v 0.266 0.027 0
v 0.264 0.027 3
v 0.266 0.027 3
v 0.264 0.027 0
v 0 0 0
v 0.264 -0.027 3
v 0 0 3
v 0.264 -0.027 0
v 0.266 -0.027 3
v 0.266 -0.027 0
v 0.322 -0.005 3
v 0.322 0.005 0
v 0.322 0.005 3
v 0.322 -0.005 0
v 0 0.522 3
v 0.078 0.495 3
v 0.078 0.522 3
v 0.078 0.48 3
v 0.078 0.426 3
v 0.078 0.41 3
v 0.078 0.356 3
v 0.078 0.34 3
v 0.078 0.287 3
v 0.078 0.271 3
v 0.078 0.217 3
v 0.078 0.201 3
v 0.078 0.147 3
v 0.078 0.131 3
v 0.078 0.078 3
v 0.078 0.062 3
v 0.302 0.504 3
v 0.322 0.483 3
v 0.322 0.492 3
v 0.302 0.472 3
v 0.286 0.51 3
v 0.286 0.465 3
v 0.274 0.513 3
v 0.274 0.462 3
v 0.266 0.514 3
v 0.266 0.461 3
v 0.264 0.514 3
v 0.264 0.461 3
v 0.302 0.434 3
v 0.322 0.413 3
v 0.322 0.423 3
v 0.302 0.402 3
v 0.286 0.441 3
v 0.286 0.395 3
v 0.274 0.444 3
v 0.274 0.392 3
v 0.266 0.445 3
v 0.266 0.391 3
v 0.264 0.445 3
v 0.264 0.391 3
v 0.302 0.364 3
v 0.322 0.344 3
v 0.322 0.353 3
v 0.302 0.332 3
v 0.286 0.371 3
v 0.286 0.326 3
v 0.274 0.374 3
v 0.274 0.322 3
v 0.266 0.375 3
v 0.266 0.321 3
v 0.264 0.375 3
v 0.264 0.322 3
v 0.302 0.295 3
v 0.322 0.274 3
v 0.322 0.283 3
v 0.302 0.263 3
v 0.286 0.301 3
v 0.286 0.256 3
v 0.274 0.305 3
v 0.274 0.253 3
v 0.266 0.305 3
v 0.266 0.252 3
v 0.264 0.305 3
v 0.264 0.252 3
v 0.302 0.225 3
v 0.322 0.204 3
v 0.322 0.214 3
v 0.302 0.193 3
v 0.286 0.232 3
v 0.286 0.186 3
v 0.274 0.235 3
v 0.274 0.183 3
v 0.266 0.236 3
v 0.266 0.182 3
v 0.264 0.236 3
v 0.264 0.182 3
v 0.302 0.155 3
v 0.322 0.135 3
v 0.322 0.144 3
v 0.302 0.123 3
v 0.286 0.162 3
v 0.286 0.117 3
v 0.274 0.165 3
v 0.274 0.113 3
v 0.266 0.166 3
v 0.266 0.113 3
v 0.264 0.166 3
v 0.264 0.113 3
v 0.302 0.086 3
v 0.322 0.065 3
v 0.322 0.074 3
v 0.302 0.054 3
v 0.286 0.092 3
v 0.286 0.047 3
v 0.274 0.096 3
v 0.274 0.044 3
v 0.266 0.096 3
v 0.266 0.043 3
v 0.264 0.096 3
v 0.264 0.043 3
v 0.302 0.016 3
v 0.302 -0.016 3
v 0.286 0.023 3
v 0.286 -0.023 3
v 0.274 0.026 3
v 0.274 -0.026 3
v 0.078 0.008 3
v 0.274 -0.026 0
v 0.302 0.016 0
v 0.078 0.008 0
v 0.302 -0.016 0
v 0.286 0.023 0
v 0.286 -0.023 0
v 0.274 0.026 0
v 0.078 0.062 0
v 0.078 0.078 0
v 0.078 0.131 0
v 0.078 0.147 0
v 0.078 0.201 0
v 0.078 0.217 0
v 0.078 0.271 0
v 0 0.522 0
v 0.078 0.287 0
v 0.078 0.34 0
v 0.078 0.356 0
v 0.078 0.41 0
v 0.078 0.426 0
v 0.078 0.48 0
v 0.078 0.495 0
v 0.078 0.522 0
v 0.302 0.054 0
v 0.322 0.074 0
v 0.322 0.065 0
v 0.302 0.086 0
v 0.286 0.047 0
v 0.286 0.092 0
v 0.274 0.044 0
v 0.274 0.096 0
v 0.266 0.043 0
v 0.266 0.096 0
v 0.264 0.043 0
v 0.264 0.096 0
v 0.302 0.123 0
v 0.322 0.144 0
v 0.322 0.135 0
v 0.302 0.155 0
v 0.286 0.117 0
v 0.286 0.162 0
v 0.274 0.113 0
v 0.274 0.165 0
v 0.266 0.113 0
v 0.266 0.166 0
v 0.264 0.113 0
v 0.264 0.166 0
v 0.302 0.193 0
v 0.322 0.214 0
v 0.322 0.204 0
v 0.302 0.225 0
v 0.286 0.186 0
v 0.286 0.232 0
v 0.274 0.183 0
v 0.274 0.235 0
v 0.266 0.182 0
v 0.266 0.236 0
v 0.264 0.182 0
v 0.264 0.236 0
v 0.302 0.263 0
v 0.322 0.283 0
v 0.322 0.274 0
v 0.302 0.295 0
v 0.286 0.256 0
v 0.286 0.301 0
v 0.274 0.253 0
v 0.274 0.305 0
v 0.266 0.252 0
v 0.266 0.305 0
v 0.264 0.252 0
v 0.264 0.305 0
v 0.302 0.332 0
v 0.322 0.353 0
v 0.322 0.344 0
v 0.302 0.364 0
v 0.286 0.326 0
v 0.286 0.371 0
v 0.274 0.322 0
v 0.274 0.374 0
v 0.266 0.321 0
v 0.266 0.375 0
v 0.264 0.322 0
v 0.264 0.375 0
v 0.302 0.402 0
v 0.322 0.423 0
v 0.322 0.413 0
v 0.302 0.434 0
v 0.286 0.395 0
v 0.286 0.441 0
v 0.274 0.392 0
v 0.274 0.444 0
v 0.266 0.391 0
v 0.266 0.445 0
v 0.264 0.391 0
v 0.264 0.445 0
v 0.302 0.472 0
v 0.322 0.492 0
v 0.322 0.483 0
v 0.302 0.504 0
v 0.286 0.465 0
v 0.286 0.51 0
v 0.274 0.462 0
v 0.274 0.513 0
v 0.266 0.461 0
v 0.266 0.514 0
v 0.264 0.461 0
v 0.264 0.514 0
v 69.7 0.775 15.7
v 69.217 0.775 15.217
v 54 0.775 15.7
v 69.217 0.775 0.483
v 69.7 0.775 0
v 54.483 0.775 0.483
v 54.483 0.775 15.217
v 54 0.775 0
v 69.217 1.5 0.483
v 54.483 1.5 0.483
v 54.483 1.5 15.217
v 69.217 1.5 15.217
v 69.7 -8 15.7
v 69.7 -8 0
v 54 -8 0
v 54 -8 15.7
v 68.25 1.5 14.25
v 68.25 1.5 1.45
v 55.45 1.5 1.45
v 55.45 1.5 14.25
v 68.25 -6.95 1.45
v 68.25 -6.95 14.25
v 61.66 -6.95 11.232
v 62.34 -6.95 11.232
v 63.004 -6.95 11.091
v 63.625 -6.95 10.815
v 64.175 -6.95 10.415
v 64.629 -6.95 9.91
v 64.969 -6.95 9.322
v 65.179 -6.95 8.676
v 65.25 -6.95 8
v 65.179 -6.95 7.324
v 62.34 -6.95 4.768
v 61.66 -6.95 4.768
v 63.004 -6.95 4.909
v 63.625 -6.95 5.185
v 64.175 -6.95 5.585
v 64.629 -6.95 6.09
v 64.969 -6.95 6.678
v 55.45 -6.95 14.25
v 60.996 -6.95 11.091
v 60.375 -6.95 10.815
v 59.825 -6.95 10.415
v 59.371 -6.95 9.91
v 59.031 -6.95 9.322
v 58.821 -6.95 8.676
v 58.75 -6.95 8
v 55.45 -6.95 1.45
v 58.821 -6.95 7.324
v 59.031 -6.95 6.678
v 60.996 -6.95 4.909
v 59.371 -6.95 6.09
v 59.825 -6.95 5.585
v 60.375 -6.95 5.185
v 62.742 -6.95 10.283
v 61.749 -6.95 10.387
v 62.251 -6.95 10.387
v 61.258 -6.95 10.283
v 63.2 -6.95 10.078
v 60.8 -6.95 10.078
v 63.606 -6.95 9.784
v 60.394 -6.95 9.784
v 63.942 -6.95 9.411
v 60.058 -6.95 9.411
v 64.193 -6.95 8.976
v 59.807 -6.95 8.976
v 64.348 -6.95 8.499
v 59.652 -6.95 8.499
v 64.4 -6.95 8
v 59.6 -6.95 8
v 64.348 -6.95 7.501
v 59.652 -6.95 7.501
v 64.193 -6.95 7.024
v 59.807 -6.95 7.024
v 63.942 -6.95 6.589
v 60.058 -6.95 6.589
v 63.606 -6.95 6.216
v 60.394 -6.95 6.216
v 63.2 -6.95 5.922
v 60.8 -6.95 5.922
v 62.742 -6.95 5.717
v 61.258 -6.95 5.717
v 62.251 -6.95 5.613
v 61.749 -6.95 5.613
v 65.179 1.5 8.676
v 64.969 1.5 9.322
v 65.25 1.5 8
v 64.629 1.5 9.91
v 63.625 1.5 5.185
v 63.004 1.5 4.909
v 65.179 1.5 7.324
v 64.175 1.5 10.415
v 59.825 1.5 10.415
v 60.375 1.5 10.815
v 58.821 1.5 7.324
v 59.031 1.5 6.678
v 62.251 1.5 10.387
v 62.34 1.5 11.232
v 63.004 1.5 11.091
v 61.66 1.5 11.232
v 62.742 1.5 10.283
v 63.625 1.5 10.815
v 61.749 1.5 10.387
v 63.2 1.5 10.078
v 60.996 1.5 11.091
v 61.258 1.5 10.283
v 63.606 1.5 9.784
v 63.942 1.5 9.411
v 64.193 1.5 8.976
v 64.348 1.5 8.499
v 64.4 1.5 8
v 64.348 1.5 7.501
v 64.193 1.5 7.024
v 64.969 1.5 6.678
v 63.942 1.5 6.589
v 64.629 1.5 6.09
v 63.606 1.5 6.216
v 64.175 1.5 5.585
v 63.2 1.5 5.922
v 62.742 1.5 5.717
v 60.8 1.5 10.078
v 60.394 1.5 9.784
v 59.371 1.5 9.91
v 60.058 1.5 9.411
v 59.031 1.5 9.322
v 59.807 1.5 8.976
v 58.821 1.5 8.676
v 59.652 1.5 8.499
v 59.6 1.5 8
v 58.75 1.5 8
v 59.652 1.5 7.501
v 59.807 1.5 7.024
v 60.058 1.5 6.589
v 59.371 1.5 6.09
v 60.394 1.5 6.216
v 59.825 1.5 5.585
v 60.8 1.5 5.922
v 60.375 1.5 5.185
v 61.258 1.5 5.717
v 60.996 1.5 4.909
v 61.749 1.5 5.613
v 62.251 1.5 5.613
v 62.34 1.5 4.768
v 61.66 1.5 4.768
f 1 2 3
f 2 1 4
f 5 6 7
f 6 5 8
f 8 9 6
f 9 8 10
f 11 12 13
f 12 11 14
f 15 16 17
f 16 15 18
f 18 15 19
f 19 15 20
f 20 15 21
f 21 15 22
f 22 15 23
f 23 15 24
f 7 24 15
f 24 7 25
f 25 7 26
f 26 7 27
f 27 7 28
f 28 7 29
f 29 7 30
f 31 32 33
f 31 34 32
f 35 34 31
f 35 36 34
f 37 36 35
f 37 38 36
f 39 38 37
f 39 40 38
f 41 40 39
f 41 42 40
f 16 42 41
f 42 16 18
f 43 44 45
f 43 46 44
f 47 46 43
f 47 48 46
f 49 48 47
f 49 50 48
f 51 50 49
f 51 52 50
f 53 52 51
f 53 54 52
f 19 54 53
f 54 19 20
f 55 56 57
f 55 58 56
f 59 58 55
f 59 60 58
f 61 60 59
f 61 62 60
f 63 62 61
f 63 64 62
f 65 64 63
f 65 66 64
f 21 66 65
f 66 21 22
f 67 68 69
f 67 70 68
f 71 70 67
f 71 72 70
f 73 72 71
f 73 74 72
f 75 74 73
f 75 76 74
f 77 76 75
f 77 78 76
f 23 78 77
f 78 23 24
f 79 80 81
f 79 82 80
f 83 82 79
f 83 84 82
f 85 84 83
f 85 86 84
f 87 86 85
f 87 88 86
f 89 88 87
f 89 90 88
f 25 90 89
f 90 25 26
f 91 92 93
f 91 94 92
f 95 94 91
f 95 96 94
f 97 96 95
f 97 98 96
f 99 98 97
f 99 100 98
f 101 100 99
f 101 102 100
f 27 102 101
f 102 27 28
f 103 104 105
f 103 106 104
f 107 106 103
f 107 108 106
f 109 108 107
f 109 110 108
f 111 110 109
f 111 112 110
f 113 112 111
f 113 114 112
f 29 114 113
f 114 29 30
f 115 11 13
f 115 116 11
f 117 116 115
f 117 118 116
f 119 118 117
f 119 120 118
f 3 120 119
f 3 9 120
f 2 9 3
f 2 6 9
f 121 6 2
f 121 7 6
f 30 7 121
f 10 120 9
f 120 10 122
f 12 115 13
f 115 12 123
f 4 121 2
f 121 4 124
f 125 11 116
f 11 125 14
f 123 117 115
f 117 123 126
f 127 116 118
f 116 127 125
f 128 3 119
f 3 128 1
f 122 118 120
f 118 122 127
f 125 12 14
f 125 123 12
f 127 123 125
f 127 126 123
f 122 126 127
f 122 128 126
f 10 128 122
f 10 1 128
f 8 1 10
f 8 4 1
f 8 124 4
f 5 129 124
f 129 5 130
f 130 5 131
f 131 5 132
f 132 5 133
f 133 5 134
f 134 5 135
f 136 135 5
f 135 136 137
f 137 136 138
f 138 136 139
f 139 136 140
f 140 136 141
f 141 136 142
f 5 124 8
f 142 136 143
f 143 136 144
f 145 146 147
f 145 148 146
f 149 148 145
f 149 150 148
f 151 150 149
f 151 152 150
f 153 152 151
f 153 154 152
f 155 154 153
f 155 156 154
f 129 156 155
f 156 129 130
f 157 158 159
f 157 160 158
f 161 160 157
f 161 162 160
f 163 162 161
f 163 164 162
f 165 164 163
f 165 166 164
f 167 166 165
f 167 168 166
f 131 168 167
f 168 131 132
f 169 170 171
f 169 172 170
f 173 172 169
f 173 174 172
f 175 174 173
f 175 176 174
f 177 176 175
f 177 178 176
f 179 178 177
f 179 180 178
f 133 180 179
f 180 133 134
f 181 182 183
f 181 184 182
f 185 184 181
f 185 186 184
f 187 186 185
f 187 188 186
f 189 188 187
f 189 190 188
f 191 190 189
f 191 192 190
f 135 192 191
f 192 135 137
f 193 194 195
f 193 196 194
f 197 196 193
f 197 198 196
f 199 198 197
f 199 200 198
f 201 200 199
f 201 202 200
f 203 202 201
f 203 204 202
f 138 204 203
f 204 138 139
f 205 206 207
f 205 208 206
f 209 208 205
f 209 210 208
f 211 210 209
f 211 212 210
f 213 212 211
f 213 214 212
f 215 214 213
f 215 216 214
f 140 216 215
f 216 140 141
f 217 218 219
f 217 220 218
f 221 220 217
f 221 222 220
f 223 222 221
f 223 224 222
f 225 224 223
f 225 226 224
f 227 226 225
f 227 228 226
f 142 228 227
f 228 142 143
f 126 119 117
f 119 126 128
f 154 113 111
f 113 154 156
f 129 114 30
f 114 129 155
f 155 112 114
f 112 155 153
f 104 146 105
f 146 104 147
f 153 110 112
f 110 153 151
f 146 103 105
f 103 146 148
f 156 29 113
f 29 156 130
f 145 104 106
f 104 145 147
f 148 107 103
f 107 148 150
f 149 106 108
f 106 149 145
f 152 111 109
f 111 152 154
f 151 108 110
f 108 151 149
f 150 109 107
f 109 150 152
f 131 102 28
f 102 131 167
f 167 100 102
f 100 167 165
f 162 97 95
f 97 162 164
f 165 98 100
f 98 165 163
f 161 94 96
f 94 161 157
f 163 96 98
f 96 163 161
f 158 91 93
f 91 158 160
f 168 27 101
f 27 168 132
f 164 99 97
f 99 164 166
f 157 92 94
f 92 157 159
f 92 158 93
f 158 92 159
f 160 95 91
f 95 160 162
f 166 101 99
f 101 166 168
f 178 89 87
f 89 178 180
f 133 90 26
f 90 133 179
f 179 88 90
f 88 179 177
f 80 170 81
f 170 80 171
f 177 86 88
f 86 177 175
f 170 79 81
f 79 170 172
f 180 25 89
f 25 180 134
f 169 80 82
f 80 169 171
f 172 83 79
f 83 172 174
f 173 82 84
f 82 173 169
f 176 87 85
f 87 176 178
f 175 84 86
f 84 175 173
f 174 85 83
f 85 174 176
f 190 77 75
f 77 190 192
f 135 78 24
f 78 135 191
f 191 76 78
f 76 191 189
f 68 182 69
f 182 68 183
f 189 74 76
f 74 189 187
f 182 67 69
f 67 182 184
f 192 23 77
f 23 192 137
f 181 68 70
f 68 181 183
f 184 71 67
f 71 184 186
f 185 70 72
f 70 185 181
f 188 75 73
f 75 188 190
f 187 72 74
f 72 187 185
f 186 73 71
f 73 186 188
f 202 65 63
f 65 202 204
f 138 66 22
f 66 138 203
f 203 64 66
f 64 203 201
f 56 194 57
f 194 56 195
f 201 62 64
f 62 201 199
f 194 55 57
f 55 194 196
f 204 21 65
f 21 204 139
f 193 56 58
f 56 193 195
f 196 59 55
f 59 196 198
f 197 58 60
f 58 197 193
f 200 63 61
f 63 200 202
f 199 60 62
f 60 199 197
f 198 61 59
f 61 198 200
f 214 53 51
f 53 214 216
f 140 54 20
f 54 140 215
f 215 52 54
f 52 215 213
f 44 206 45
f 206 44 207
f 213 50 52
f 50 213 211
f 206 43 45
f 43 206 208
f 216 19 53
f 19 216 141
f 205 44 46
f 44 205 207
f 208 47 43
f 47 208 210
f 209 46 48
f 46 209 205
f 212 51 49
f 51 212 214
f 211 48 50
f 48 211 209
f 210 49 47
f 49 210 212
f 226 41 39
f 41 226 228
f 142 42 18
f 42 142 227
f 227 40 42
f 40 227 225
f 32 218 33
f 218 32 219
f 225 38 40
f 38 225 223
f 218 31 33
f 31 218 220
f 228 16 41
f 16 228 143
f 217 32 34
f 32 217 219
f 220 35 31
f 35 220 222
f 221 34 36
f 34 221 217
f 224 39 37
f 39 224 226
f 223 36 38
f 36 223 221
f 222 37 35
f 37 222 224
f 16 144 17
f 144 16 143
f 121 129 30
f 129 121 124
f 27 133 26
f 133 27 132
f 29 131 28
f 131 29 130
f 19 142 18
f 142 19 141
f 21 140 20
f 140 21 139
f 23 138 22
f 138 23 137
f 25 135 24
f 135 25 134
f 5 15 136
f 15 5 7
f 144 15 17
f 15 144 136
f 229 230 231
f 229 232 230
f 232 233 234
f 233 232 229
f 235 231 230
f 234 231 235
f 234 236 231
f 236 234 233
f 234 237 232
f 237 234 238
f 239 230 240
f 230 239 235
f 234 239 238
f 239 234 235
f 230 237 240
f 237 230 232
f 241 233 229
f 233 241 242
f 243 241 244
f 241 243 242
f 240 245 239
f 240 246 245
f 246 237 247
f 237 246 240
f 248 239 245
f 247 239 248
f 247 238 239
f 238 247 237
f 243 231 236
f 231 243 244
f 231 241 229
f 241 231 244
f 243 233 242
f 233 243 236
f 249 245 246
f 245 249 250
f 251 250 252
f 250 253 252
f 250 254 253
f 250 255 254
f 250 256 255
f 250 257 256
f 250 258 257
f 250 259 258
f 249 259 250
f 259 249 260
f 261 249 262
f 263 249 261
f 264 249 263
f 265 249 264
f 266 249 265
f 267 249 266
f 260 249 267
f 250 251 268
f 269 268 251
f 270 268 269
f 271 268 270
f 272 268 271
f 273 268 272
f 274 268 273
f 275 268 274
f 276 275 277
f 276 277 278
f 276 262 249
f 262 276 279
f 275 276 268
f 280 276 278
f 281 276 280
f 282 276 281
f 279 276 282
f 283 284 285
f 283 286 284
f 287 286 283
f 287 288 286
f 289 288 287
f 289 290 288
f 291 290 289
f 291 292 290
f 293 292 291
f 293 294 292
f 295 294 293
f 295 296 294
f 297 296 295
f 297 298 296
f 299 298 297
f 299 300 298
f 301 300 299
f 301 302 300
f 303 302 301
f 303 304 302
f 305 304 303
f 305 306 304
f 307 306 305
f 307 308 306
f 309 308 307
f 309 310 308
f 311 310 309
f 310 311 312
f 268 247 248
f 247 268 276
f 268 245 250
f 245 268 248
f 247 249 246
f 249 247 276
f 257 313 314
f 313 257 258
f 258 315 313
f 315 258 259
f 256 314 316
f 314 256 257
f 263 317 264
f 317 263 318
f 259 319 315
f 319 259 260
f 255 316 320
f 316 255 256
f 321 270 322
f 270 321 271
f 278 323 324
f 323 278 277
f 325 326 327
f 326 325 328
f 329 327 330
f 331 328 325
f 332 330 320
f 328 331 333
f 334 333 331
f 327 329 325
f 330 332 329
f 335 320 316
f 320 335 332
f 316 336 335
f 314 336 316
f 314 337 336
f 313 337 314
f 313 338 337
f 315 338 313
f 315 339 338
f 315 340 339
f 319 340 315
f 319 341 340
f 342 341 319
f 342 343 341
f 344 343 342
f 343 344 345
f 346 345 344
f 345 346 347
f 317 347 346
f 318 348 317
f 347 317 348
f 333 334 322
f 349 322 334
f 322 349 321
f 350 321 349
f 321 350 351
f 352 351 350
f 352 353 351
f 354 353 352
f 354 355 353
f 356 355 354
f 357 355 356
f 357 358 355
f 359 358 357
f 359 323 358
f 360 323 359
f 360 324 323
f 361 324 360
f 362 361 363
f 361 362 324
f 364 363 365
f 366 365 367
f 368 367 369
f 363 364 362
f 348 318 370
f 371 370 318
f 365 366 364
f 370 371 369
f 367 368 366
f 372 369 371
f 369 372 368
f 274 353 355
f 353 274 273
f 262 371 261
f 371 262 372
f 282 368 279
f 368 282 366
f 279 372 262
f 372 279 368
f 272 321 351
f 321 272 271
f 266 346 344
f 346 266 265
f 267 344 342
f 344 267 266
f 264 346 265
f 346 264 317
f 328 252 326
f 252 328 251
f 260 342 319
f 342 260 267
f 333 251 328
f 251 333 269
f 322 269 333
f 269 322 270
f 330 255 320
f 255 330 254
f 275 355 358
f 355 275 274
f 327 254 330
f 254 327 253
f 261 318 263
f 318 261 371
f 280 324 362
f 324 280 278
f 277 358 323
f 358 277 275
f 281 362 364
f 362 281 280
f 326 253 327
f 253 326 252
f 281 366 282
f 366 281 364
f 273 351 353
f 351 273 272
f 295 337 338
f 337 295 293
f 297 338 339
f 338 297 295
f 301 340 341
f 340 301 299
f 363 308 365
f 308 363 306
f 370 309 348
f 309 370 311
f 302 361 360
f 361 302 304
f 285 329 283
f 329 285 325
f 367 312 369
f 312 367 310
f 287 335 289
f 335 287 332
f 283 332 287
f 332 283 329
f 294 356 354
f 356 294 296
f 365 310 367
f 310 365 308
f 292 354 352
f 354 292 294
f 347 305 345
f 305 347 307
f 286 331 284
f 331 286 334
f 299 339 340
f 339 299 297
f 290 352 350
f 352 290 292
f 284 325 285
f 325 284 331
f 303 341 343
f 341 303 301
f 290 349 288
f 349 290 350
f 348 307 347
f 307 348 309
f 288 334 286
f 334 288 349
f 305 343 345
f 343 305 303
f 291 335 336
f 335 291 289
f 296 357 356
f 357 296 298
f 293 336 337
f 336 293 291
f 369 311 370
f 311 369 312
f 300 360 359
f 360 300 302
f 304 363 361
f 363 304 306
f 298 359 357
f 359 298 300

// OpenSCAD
// file: settings.scad
tooth_width=4;
rack_tooth_count=27;
tooth_height=7.5;
wheel_tooth_count=10;
// file: ../mcad/lego_compatibility.scad
// This file is placed under the public domain

// from: http://www.thingiverse.com/thing:9512
// Author: nefercheprure

// Examples:
//   standard LEGO 2x1 tile has no pin
//      block(1,2,1/3,reinforcement=false,flat_top=true);
//   standard LEGO 2x1 flat has pin
//      block(1,2,1/3,reinforcement=true);
//   standard LEGO 2x1 brick has pin
//      block(1,2,1,reinforcement=true);
//   standard LEGO 2x1 brick without pin
//      block(1,2,1,reinforcement=false);
//   standard LEGO 2x1x5 brick has no pin and has hollow knobs
//      block(1,2,5,reinforcement=false,hollow_knob=true);


knob_diameter=4.8;		//knobs on top of blocks
knob_height=2;
knob_spacing=8.0;
wall_thickness=1.45;
roof_thickness=1.05;
block_height=9.5;
pin_diameter=3;		//pin for bottom blocks with width or length of 1
post_diameter=6.5;
reinforcing_width=1.5;
axle_spline_width=2.0;
axle_diameter=5;
cylinder_precision=0.5;

/* EXAMPLES:

block(2,1,1/3,axle_hole=false,circular_hole=true,reinforcement=true,hollow_knob=true,flat_top=true);

translate([50,-10,0])
	block(1,2,1/3,axle_hole=false,circular_hole=true,reinforcement=false,hollow_knob=true,flat_top=true);

translate([10,0,0])
	block(2,2,1/3,axle_hole=false,circular_hole=true,reinforcement=true,hollow_knob=true,flat_top=true);
translate([30,0,0])
	block(2,2,1/3,axle_hole=false,circular_hole=true,reinforcement=true,hollow_knob=false,flat_top=false);
translate([50,0,0])
	block(2,2,1/3,axle_hole=false,circular_hole=true,reinforcement=true,hollow_knob=true,flat_top=false);
translate([0,20,0])
	block(3,2,2/3,axle_hole=false,circular_hole=true,reinforcement=true,hollow_knob=true,flat_top=false);
translate([20,20,0])
	block(3,2,1,axle_hole=true,circular_hole=false,reinforcement=true,hollow_knob=false,flat_top=false);
translate([40,20,0])
	block(3,2,1/3,axle_hole=false,circular_hole=false,reinforcement=false,hollow_knob=false,flat_top=false);
translate([0,-10,0])
	block(1,5,1/3,axle_hole=true,circular_hole=false,reinforcement=true,hollow_knob=false,flat_top=false);
translate([0,-20,0])
	block(1,5,1/3,axle_hole=true,circular_hole=false,reinforcement=true,hollow_knob=true,flat_top=false);
translate([0,-30,0])
	block(1,5,1/3,axle_hole=true,circular_hole=false,reinforcement=true,hollow_knob=true,flat_top=true);
//*/

module block(width,length,height,axle_hole=false,reinforcement=false, hollow_knob=false, flat_top=false, circular_hole=false, solid_bottom=true, center=false) {
	overall_length=(length-1)*knob_spacing+knob_diameter+wall_thickness*2;
	overall_width=(width-1)*knob_spacing+knob_diameter+wall_thickness*2;
	center= center==true ? 1 : 0;
	translate(center*[-overall_length/2, -overall_width/2, 0])
	union() {
		difference() {
			union() {
				// body:
				cube([overall_length,overall_width,height*block_height]);
				// knobs:
				if (flat_top != true)
				translate([knob_diameter/2+wall_thickness,knob_diameter/2+wall_thickness,0]) 
					for (ycount=[0:width-1])
						for (xcount=[0:length-1]) {
							translate([xcount*knob_spacing,ycount*knob_spacing,0])
								difference() {
									cylinder(r=knob_diameter/2,h=block_height*height+knob_height,$fs=cylinder_precision);
									if (hollow_knob==true)
										translate([0,0,-roof_thickness])
											cylinder(r=pin_diameter/2,h=block_height*height+knob_height+2*roof_thickness,$fs=cylinder_precision);
								}
					}
			}
			// hollow bottom:
			if (solid_bottom == false)
				translate([wall_thickness,wall_thickness,-roof_thickness]) cube([overall_length-wall_thickness*2,overall_width-wall_thickness*2,block_height*height]);
			// flat_top -> groove around bottom
			if (flat_top == true) {
				translate([-wall_thickness/2,-wall_thickness*2/3,-wall_thickness/2])
					cube([overall_length+wall_thickness,wall_thickness,wall_thickness]);
				translate([-wall_thickness/2,overall_width-wall_thickness/3,-wall_thickness/2])
					cube([overall_length+wall_thickness,wall_thickness,wall_thickness]);
	
				translate([-wall_thickness*2/3,-wall_thickness/2,-wall_thickness/2])
					cube([wall_thickness,overall_width+wall_thickness,wall_thickness]);
				translate([overall_length-wall_thickness/3,0,-wall_thickness/2])
					cube([wall_thickness,overall_width+wall_thickness,wall_thickness]);
			}
			if (axle_hole==true)
				if (width>1 && length>1) for (ycount=[1:width-1])
					for (xcount=[1:length-1])
						translate([xcount*knob_spacing,ycount*knob_spacing,roof_thickness])  axle(height);
			if (circular_hole==true)
				if (width>1 && length>1) for (ycount=[1:width-1])
					for (xcount=[1:length-1])
						translate([xcount*knob_spacing,ycount*knob_spacing,roof_thickness])
							cylinder(r=knob_diameter/2, h=height*block_height+roof_thickness/4,$fs=cylinder_precision);
		}

		if (reinforcement==true && width>1 && length>1)
			difference() {
				for (ycount=[1:width-1])
					for (xcount=[1:length-1])
						translate([xcount*knob_spacing,ycount*knob_spacing,0]) reinforcement(height);
				for (ycount=[1:width-1])
					for (xcount=[1:length-1])
						translate([xcount*knob_spacing,ycount*knob_spacing,-roof_thickness/2]) cylinder(r=knob_diameter/2, h=height*block_height+roof_thickness, $fs=cylinder_precision);
			}
		// posts:
		if (solid_bottom == false)
			if (width>1 && length>1) for (ycount=[1:width-1])
				for (xcount=[1:length-1])
					translate([xcount*knob_spacing,ycount*knob_spacing,0]) post(height);

		if (reinforcement == true && width==1 && length!=1)
			for (xcount=[1:length-1])
				translate([xcount*knob_spacing,overall_width/2,0]) cylinder(r=pin_diameter/2,h=block_height*height,$fs=cylinder_precision);

		if (reinforcement == true && length==1 && width!=1)
			for (ycount=[1:width-1])
				translate([overall_length/2,ycount*knob_spacing,0]) cylinder(r=pin_diameter/2,h=block_height*height,$fs=cylinder_precision);
	}
}

module post(height) {
	difference() {
		cylinder(r=post_diameter/2, h=height*block_height-roof_thickness/2,$fs=cylinder_precision);
		translate([0,0,-roof_thickness/2])
			cylinder(r=knob_diameter/2, h=height*block_height+roof_thickness/4,$fs=cylinder_precision);
	}
}

module reinforcement(height) {
	union() {
		translate([0,0,height*block_height/2]) union() {
			cube([reinforcing_width,knob_spacing+knob_diameter+wall_thickness/2,height*block_height],center=true);
			rotate(v=[0,0,1],a=90) cube([reinforcing_width,knob_spacing+knob_diameter+wall_thickness/2,height*block_height], center=true);
		}
	}
}

module axle(height) {
	translate([0,0,height*block_height/2]) union() {
		cube([axle_diameter,axle_spline_width,height*block_height],center=true);
		cube([axle_spline_width,axle_diameter,height*block_height],center=true);
	}
}
			
// file: ../external/rack_and_pinion.scad
// http://www.thingiverse.com/thing:1227374
// Customizable rack and pinion by rushman is licensed under the Creative Commons - Attribution license.
// by rushman, published Dec 26, 2015

use <MCAD/involute_gears.scad>

height = 4;

circular_pitch=180;
number_of_pinion_teeth=16; // [12:1:200]
pressure_angle = 28;

spacing_between_objects = 0; // [0:real, 5:apart]

function pitch_radius(number_of_teeth, circular_pitch) = (number_of_teeth * circular_pitch / 180) / 2;

function linear_tooth_size(number_of_teeth, circular_pitch) = 
    2*sin(360/number_of_teeth/2)*pitch_radius(number_of_teeth, circular_pitch);


module rack(circular_pitch, number_of_pinion_teeth, number_of_rack_teeth, height,
pressure_angle=28,
clearance=0.2) 

{
    pitch_diameter  =  number_of_pinion_teeth * circular_pitch / 180;
    pitch_radius = pitch_diameter/2;

    base_radius = pitch_radius*cos(pressure_angle);

    // Diametrial pitch: Number of teeth per unit length.
    pitch_diametrial = number_of_pinion_teeth / pitch_diameter;

    // Addendum: Radial distance from pitch circle to outside circle.
    addendum = 1/pitch_diametrial;

    //Outer Circle
    outer_radius = pitch_radius+addendum;

    // Dedendum: Radial distance from pitch circle to root diameter
    dedendum = addendum + clearance;

    root_radius = pitch_radius-dedendum;
    half_thick_angle = (360 / number_of_pinion_teeth) / 4;

    echo("pitch_radius", pitch_radius);
    echo("outer_radius", outer_radius);
    echo("pitch_diametrial", pitch_diametrial);
    echo("addendum", addendum);
    echo("dedendum", dedendum);

    O = 360/number_of_pinion_teeth;
    th=2*sin(O/2)*pitch_radius;
    rack_teeth=number_of_rack_teeth;
    echo("tooth_length", th);
    echo("rack_length", th*rack_teeth);

    union() {
        for (i=[0:rack_teeth]) {
            translate([0,i*th,0])
            linear_extrude(height)
            involute_gear_tooth(
                pitch_radius=pitch_radius,
                root_radius=root_radius,
                base_radius=base_radius,
                outer_radius=outer_radius,
                half_thick_angle=half_thick_angle,
                involute_facets=0);
        }
        cube([root_radius,th*rack_teeth, height]);
    }
}    


module pinion(circular_pitch, number_of_teeth, height, pressure_angle=28, clearance=0.2) {
    rotate([0,0,(number_of_teeth % 2 == 0) ? 180/number_of_teeth:0])
    gear(number_of_teeth=number_of_teeth,
            circular_pitch=circular_pitch,
            pressure_angle=pressure_angle,
            clearance = clearance,
            gear_thickness=height,
            rim_thickness=height,
            rim_width=5,
            hub_thickness=4,
            hub_diameter=4,
            bore_diameter=5,
            circles=0,
            backlash=0,
            twist=0,
            involute_facets=0,
            flat=false);
    
}

anim_phase = $t > 0.5 ? (1-$t) : $t;

th = linear_tooth_size(number_of_pinion_teeth, circular_pitch);

num_rack_teeth=ceil(number_of_pinion_teeth)/2;
translate([0,-th*number_of_pinion_teeth*anim_phase,0])
rack(circular_pitch, number_of_pinion_teeth, num_rack_teeth, height, pressure_angle);

translate([spacing_between_objects, 0, 0])
translate([pitch_radius(number_of_pinion_teeth, circular_pitch)*2,0,0])   
    rotate([0,0,anim_phase*360]) {
        color([0.3, 0.5, 0.8])
        pinion(circular_pitch, number_of_pinion_teeth, height, pressure_angle);
        
    }
$fs=0.5;


//ma=15;
//d=18;
//echo(cos(ma)*d);
// main file
use <../external/rack_and_pinion.scad>
use <../mcad/lego_compatibility.scad>

include <settings.scad>

module my_rack(){
	//CP (mm/tooth), width (mm), thickness(of base) (mm), # teeth
	rack(tooth_width,rack_tooth_count,tooth_height,3);
translate([27 * 2,1.5,0]) rotate([90,0,0]) block(2,2,1,reinforcement=false,solid_bottom=false,flat_top=true);
}

my_rack();
